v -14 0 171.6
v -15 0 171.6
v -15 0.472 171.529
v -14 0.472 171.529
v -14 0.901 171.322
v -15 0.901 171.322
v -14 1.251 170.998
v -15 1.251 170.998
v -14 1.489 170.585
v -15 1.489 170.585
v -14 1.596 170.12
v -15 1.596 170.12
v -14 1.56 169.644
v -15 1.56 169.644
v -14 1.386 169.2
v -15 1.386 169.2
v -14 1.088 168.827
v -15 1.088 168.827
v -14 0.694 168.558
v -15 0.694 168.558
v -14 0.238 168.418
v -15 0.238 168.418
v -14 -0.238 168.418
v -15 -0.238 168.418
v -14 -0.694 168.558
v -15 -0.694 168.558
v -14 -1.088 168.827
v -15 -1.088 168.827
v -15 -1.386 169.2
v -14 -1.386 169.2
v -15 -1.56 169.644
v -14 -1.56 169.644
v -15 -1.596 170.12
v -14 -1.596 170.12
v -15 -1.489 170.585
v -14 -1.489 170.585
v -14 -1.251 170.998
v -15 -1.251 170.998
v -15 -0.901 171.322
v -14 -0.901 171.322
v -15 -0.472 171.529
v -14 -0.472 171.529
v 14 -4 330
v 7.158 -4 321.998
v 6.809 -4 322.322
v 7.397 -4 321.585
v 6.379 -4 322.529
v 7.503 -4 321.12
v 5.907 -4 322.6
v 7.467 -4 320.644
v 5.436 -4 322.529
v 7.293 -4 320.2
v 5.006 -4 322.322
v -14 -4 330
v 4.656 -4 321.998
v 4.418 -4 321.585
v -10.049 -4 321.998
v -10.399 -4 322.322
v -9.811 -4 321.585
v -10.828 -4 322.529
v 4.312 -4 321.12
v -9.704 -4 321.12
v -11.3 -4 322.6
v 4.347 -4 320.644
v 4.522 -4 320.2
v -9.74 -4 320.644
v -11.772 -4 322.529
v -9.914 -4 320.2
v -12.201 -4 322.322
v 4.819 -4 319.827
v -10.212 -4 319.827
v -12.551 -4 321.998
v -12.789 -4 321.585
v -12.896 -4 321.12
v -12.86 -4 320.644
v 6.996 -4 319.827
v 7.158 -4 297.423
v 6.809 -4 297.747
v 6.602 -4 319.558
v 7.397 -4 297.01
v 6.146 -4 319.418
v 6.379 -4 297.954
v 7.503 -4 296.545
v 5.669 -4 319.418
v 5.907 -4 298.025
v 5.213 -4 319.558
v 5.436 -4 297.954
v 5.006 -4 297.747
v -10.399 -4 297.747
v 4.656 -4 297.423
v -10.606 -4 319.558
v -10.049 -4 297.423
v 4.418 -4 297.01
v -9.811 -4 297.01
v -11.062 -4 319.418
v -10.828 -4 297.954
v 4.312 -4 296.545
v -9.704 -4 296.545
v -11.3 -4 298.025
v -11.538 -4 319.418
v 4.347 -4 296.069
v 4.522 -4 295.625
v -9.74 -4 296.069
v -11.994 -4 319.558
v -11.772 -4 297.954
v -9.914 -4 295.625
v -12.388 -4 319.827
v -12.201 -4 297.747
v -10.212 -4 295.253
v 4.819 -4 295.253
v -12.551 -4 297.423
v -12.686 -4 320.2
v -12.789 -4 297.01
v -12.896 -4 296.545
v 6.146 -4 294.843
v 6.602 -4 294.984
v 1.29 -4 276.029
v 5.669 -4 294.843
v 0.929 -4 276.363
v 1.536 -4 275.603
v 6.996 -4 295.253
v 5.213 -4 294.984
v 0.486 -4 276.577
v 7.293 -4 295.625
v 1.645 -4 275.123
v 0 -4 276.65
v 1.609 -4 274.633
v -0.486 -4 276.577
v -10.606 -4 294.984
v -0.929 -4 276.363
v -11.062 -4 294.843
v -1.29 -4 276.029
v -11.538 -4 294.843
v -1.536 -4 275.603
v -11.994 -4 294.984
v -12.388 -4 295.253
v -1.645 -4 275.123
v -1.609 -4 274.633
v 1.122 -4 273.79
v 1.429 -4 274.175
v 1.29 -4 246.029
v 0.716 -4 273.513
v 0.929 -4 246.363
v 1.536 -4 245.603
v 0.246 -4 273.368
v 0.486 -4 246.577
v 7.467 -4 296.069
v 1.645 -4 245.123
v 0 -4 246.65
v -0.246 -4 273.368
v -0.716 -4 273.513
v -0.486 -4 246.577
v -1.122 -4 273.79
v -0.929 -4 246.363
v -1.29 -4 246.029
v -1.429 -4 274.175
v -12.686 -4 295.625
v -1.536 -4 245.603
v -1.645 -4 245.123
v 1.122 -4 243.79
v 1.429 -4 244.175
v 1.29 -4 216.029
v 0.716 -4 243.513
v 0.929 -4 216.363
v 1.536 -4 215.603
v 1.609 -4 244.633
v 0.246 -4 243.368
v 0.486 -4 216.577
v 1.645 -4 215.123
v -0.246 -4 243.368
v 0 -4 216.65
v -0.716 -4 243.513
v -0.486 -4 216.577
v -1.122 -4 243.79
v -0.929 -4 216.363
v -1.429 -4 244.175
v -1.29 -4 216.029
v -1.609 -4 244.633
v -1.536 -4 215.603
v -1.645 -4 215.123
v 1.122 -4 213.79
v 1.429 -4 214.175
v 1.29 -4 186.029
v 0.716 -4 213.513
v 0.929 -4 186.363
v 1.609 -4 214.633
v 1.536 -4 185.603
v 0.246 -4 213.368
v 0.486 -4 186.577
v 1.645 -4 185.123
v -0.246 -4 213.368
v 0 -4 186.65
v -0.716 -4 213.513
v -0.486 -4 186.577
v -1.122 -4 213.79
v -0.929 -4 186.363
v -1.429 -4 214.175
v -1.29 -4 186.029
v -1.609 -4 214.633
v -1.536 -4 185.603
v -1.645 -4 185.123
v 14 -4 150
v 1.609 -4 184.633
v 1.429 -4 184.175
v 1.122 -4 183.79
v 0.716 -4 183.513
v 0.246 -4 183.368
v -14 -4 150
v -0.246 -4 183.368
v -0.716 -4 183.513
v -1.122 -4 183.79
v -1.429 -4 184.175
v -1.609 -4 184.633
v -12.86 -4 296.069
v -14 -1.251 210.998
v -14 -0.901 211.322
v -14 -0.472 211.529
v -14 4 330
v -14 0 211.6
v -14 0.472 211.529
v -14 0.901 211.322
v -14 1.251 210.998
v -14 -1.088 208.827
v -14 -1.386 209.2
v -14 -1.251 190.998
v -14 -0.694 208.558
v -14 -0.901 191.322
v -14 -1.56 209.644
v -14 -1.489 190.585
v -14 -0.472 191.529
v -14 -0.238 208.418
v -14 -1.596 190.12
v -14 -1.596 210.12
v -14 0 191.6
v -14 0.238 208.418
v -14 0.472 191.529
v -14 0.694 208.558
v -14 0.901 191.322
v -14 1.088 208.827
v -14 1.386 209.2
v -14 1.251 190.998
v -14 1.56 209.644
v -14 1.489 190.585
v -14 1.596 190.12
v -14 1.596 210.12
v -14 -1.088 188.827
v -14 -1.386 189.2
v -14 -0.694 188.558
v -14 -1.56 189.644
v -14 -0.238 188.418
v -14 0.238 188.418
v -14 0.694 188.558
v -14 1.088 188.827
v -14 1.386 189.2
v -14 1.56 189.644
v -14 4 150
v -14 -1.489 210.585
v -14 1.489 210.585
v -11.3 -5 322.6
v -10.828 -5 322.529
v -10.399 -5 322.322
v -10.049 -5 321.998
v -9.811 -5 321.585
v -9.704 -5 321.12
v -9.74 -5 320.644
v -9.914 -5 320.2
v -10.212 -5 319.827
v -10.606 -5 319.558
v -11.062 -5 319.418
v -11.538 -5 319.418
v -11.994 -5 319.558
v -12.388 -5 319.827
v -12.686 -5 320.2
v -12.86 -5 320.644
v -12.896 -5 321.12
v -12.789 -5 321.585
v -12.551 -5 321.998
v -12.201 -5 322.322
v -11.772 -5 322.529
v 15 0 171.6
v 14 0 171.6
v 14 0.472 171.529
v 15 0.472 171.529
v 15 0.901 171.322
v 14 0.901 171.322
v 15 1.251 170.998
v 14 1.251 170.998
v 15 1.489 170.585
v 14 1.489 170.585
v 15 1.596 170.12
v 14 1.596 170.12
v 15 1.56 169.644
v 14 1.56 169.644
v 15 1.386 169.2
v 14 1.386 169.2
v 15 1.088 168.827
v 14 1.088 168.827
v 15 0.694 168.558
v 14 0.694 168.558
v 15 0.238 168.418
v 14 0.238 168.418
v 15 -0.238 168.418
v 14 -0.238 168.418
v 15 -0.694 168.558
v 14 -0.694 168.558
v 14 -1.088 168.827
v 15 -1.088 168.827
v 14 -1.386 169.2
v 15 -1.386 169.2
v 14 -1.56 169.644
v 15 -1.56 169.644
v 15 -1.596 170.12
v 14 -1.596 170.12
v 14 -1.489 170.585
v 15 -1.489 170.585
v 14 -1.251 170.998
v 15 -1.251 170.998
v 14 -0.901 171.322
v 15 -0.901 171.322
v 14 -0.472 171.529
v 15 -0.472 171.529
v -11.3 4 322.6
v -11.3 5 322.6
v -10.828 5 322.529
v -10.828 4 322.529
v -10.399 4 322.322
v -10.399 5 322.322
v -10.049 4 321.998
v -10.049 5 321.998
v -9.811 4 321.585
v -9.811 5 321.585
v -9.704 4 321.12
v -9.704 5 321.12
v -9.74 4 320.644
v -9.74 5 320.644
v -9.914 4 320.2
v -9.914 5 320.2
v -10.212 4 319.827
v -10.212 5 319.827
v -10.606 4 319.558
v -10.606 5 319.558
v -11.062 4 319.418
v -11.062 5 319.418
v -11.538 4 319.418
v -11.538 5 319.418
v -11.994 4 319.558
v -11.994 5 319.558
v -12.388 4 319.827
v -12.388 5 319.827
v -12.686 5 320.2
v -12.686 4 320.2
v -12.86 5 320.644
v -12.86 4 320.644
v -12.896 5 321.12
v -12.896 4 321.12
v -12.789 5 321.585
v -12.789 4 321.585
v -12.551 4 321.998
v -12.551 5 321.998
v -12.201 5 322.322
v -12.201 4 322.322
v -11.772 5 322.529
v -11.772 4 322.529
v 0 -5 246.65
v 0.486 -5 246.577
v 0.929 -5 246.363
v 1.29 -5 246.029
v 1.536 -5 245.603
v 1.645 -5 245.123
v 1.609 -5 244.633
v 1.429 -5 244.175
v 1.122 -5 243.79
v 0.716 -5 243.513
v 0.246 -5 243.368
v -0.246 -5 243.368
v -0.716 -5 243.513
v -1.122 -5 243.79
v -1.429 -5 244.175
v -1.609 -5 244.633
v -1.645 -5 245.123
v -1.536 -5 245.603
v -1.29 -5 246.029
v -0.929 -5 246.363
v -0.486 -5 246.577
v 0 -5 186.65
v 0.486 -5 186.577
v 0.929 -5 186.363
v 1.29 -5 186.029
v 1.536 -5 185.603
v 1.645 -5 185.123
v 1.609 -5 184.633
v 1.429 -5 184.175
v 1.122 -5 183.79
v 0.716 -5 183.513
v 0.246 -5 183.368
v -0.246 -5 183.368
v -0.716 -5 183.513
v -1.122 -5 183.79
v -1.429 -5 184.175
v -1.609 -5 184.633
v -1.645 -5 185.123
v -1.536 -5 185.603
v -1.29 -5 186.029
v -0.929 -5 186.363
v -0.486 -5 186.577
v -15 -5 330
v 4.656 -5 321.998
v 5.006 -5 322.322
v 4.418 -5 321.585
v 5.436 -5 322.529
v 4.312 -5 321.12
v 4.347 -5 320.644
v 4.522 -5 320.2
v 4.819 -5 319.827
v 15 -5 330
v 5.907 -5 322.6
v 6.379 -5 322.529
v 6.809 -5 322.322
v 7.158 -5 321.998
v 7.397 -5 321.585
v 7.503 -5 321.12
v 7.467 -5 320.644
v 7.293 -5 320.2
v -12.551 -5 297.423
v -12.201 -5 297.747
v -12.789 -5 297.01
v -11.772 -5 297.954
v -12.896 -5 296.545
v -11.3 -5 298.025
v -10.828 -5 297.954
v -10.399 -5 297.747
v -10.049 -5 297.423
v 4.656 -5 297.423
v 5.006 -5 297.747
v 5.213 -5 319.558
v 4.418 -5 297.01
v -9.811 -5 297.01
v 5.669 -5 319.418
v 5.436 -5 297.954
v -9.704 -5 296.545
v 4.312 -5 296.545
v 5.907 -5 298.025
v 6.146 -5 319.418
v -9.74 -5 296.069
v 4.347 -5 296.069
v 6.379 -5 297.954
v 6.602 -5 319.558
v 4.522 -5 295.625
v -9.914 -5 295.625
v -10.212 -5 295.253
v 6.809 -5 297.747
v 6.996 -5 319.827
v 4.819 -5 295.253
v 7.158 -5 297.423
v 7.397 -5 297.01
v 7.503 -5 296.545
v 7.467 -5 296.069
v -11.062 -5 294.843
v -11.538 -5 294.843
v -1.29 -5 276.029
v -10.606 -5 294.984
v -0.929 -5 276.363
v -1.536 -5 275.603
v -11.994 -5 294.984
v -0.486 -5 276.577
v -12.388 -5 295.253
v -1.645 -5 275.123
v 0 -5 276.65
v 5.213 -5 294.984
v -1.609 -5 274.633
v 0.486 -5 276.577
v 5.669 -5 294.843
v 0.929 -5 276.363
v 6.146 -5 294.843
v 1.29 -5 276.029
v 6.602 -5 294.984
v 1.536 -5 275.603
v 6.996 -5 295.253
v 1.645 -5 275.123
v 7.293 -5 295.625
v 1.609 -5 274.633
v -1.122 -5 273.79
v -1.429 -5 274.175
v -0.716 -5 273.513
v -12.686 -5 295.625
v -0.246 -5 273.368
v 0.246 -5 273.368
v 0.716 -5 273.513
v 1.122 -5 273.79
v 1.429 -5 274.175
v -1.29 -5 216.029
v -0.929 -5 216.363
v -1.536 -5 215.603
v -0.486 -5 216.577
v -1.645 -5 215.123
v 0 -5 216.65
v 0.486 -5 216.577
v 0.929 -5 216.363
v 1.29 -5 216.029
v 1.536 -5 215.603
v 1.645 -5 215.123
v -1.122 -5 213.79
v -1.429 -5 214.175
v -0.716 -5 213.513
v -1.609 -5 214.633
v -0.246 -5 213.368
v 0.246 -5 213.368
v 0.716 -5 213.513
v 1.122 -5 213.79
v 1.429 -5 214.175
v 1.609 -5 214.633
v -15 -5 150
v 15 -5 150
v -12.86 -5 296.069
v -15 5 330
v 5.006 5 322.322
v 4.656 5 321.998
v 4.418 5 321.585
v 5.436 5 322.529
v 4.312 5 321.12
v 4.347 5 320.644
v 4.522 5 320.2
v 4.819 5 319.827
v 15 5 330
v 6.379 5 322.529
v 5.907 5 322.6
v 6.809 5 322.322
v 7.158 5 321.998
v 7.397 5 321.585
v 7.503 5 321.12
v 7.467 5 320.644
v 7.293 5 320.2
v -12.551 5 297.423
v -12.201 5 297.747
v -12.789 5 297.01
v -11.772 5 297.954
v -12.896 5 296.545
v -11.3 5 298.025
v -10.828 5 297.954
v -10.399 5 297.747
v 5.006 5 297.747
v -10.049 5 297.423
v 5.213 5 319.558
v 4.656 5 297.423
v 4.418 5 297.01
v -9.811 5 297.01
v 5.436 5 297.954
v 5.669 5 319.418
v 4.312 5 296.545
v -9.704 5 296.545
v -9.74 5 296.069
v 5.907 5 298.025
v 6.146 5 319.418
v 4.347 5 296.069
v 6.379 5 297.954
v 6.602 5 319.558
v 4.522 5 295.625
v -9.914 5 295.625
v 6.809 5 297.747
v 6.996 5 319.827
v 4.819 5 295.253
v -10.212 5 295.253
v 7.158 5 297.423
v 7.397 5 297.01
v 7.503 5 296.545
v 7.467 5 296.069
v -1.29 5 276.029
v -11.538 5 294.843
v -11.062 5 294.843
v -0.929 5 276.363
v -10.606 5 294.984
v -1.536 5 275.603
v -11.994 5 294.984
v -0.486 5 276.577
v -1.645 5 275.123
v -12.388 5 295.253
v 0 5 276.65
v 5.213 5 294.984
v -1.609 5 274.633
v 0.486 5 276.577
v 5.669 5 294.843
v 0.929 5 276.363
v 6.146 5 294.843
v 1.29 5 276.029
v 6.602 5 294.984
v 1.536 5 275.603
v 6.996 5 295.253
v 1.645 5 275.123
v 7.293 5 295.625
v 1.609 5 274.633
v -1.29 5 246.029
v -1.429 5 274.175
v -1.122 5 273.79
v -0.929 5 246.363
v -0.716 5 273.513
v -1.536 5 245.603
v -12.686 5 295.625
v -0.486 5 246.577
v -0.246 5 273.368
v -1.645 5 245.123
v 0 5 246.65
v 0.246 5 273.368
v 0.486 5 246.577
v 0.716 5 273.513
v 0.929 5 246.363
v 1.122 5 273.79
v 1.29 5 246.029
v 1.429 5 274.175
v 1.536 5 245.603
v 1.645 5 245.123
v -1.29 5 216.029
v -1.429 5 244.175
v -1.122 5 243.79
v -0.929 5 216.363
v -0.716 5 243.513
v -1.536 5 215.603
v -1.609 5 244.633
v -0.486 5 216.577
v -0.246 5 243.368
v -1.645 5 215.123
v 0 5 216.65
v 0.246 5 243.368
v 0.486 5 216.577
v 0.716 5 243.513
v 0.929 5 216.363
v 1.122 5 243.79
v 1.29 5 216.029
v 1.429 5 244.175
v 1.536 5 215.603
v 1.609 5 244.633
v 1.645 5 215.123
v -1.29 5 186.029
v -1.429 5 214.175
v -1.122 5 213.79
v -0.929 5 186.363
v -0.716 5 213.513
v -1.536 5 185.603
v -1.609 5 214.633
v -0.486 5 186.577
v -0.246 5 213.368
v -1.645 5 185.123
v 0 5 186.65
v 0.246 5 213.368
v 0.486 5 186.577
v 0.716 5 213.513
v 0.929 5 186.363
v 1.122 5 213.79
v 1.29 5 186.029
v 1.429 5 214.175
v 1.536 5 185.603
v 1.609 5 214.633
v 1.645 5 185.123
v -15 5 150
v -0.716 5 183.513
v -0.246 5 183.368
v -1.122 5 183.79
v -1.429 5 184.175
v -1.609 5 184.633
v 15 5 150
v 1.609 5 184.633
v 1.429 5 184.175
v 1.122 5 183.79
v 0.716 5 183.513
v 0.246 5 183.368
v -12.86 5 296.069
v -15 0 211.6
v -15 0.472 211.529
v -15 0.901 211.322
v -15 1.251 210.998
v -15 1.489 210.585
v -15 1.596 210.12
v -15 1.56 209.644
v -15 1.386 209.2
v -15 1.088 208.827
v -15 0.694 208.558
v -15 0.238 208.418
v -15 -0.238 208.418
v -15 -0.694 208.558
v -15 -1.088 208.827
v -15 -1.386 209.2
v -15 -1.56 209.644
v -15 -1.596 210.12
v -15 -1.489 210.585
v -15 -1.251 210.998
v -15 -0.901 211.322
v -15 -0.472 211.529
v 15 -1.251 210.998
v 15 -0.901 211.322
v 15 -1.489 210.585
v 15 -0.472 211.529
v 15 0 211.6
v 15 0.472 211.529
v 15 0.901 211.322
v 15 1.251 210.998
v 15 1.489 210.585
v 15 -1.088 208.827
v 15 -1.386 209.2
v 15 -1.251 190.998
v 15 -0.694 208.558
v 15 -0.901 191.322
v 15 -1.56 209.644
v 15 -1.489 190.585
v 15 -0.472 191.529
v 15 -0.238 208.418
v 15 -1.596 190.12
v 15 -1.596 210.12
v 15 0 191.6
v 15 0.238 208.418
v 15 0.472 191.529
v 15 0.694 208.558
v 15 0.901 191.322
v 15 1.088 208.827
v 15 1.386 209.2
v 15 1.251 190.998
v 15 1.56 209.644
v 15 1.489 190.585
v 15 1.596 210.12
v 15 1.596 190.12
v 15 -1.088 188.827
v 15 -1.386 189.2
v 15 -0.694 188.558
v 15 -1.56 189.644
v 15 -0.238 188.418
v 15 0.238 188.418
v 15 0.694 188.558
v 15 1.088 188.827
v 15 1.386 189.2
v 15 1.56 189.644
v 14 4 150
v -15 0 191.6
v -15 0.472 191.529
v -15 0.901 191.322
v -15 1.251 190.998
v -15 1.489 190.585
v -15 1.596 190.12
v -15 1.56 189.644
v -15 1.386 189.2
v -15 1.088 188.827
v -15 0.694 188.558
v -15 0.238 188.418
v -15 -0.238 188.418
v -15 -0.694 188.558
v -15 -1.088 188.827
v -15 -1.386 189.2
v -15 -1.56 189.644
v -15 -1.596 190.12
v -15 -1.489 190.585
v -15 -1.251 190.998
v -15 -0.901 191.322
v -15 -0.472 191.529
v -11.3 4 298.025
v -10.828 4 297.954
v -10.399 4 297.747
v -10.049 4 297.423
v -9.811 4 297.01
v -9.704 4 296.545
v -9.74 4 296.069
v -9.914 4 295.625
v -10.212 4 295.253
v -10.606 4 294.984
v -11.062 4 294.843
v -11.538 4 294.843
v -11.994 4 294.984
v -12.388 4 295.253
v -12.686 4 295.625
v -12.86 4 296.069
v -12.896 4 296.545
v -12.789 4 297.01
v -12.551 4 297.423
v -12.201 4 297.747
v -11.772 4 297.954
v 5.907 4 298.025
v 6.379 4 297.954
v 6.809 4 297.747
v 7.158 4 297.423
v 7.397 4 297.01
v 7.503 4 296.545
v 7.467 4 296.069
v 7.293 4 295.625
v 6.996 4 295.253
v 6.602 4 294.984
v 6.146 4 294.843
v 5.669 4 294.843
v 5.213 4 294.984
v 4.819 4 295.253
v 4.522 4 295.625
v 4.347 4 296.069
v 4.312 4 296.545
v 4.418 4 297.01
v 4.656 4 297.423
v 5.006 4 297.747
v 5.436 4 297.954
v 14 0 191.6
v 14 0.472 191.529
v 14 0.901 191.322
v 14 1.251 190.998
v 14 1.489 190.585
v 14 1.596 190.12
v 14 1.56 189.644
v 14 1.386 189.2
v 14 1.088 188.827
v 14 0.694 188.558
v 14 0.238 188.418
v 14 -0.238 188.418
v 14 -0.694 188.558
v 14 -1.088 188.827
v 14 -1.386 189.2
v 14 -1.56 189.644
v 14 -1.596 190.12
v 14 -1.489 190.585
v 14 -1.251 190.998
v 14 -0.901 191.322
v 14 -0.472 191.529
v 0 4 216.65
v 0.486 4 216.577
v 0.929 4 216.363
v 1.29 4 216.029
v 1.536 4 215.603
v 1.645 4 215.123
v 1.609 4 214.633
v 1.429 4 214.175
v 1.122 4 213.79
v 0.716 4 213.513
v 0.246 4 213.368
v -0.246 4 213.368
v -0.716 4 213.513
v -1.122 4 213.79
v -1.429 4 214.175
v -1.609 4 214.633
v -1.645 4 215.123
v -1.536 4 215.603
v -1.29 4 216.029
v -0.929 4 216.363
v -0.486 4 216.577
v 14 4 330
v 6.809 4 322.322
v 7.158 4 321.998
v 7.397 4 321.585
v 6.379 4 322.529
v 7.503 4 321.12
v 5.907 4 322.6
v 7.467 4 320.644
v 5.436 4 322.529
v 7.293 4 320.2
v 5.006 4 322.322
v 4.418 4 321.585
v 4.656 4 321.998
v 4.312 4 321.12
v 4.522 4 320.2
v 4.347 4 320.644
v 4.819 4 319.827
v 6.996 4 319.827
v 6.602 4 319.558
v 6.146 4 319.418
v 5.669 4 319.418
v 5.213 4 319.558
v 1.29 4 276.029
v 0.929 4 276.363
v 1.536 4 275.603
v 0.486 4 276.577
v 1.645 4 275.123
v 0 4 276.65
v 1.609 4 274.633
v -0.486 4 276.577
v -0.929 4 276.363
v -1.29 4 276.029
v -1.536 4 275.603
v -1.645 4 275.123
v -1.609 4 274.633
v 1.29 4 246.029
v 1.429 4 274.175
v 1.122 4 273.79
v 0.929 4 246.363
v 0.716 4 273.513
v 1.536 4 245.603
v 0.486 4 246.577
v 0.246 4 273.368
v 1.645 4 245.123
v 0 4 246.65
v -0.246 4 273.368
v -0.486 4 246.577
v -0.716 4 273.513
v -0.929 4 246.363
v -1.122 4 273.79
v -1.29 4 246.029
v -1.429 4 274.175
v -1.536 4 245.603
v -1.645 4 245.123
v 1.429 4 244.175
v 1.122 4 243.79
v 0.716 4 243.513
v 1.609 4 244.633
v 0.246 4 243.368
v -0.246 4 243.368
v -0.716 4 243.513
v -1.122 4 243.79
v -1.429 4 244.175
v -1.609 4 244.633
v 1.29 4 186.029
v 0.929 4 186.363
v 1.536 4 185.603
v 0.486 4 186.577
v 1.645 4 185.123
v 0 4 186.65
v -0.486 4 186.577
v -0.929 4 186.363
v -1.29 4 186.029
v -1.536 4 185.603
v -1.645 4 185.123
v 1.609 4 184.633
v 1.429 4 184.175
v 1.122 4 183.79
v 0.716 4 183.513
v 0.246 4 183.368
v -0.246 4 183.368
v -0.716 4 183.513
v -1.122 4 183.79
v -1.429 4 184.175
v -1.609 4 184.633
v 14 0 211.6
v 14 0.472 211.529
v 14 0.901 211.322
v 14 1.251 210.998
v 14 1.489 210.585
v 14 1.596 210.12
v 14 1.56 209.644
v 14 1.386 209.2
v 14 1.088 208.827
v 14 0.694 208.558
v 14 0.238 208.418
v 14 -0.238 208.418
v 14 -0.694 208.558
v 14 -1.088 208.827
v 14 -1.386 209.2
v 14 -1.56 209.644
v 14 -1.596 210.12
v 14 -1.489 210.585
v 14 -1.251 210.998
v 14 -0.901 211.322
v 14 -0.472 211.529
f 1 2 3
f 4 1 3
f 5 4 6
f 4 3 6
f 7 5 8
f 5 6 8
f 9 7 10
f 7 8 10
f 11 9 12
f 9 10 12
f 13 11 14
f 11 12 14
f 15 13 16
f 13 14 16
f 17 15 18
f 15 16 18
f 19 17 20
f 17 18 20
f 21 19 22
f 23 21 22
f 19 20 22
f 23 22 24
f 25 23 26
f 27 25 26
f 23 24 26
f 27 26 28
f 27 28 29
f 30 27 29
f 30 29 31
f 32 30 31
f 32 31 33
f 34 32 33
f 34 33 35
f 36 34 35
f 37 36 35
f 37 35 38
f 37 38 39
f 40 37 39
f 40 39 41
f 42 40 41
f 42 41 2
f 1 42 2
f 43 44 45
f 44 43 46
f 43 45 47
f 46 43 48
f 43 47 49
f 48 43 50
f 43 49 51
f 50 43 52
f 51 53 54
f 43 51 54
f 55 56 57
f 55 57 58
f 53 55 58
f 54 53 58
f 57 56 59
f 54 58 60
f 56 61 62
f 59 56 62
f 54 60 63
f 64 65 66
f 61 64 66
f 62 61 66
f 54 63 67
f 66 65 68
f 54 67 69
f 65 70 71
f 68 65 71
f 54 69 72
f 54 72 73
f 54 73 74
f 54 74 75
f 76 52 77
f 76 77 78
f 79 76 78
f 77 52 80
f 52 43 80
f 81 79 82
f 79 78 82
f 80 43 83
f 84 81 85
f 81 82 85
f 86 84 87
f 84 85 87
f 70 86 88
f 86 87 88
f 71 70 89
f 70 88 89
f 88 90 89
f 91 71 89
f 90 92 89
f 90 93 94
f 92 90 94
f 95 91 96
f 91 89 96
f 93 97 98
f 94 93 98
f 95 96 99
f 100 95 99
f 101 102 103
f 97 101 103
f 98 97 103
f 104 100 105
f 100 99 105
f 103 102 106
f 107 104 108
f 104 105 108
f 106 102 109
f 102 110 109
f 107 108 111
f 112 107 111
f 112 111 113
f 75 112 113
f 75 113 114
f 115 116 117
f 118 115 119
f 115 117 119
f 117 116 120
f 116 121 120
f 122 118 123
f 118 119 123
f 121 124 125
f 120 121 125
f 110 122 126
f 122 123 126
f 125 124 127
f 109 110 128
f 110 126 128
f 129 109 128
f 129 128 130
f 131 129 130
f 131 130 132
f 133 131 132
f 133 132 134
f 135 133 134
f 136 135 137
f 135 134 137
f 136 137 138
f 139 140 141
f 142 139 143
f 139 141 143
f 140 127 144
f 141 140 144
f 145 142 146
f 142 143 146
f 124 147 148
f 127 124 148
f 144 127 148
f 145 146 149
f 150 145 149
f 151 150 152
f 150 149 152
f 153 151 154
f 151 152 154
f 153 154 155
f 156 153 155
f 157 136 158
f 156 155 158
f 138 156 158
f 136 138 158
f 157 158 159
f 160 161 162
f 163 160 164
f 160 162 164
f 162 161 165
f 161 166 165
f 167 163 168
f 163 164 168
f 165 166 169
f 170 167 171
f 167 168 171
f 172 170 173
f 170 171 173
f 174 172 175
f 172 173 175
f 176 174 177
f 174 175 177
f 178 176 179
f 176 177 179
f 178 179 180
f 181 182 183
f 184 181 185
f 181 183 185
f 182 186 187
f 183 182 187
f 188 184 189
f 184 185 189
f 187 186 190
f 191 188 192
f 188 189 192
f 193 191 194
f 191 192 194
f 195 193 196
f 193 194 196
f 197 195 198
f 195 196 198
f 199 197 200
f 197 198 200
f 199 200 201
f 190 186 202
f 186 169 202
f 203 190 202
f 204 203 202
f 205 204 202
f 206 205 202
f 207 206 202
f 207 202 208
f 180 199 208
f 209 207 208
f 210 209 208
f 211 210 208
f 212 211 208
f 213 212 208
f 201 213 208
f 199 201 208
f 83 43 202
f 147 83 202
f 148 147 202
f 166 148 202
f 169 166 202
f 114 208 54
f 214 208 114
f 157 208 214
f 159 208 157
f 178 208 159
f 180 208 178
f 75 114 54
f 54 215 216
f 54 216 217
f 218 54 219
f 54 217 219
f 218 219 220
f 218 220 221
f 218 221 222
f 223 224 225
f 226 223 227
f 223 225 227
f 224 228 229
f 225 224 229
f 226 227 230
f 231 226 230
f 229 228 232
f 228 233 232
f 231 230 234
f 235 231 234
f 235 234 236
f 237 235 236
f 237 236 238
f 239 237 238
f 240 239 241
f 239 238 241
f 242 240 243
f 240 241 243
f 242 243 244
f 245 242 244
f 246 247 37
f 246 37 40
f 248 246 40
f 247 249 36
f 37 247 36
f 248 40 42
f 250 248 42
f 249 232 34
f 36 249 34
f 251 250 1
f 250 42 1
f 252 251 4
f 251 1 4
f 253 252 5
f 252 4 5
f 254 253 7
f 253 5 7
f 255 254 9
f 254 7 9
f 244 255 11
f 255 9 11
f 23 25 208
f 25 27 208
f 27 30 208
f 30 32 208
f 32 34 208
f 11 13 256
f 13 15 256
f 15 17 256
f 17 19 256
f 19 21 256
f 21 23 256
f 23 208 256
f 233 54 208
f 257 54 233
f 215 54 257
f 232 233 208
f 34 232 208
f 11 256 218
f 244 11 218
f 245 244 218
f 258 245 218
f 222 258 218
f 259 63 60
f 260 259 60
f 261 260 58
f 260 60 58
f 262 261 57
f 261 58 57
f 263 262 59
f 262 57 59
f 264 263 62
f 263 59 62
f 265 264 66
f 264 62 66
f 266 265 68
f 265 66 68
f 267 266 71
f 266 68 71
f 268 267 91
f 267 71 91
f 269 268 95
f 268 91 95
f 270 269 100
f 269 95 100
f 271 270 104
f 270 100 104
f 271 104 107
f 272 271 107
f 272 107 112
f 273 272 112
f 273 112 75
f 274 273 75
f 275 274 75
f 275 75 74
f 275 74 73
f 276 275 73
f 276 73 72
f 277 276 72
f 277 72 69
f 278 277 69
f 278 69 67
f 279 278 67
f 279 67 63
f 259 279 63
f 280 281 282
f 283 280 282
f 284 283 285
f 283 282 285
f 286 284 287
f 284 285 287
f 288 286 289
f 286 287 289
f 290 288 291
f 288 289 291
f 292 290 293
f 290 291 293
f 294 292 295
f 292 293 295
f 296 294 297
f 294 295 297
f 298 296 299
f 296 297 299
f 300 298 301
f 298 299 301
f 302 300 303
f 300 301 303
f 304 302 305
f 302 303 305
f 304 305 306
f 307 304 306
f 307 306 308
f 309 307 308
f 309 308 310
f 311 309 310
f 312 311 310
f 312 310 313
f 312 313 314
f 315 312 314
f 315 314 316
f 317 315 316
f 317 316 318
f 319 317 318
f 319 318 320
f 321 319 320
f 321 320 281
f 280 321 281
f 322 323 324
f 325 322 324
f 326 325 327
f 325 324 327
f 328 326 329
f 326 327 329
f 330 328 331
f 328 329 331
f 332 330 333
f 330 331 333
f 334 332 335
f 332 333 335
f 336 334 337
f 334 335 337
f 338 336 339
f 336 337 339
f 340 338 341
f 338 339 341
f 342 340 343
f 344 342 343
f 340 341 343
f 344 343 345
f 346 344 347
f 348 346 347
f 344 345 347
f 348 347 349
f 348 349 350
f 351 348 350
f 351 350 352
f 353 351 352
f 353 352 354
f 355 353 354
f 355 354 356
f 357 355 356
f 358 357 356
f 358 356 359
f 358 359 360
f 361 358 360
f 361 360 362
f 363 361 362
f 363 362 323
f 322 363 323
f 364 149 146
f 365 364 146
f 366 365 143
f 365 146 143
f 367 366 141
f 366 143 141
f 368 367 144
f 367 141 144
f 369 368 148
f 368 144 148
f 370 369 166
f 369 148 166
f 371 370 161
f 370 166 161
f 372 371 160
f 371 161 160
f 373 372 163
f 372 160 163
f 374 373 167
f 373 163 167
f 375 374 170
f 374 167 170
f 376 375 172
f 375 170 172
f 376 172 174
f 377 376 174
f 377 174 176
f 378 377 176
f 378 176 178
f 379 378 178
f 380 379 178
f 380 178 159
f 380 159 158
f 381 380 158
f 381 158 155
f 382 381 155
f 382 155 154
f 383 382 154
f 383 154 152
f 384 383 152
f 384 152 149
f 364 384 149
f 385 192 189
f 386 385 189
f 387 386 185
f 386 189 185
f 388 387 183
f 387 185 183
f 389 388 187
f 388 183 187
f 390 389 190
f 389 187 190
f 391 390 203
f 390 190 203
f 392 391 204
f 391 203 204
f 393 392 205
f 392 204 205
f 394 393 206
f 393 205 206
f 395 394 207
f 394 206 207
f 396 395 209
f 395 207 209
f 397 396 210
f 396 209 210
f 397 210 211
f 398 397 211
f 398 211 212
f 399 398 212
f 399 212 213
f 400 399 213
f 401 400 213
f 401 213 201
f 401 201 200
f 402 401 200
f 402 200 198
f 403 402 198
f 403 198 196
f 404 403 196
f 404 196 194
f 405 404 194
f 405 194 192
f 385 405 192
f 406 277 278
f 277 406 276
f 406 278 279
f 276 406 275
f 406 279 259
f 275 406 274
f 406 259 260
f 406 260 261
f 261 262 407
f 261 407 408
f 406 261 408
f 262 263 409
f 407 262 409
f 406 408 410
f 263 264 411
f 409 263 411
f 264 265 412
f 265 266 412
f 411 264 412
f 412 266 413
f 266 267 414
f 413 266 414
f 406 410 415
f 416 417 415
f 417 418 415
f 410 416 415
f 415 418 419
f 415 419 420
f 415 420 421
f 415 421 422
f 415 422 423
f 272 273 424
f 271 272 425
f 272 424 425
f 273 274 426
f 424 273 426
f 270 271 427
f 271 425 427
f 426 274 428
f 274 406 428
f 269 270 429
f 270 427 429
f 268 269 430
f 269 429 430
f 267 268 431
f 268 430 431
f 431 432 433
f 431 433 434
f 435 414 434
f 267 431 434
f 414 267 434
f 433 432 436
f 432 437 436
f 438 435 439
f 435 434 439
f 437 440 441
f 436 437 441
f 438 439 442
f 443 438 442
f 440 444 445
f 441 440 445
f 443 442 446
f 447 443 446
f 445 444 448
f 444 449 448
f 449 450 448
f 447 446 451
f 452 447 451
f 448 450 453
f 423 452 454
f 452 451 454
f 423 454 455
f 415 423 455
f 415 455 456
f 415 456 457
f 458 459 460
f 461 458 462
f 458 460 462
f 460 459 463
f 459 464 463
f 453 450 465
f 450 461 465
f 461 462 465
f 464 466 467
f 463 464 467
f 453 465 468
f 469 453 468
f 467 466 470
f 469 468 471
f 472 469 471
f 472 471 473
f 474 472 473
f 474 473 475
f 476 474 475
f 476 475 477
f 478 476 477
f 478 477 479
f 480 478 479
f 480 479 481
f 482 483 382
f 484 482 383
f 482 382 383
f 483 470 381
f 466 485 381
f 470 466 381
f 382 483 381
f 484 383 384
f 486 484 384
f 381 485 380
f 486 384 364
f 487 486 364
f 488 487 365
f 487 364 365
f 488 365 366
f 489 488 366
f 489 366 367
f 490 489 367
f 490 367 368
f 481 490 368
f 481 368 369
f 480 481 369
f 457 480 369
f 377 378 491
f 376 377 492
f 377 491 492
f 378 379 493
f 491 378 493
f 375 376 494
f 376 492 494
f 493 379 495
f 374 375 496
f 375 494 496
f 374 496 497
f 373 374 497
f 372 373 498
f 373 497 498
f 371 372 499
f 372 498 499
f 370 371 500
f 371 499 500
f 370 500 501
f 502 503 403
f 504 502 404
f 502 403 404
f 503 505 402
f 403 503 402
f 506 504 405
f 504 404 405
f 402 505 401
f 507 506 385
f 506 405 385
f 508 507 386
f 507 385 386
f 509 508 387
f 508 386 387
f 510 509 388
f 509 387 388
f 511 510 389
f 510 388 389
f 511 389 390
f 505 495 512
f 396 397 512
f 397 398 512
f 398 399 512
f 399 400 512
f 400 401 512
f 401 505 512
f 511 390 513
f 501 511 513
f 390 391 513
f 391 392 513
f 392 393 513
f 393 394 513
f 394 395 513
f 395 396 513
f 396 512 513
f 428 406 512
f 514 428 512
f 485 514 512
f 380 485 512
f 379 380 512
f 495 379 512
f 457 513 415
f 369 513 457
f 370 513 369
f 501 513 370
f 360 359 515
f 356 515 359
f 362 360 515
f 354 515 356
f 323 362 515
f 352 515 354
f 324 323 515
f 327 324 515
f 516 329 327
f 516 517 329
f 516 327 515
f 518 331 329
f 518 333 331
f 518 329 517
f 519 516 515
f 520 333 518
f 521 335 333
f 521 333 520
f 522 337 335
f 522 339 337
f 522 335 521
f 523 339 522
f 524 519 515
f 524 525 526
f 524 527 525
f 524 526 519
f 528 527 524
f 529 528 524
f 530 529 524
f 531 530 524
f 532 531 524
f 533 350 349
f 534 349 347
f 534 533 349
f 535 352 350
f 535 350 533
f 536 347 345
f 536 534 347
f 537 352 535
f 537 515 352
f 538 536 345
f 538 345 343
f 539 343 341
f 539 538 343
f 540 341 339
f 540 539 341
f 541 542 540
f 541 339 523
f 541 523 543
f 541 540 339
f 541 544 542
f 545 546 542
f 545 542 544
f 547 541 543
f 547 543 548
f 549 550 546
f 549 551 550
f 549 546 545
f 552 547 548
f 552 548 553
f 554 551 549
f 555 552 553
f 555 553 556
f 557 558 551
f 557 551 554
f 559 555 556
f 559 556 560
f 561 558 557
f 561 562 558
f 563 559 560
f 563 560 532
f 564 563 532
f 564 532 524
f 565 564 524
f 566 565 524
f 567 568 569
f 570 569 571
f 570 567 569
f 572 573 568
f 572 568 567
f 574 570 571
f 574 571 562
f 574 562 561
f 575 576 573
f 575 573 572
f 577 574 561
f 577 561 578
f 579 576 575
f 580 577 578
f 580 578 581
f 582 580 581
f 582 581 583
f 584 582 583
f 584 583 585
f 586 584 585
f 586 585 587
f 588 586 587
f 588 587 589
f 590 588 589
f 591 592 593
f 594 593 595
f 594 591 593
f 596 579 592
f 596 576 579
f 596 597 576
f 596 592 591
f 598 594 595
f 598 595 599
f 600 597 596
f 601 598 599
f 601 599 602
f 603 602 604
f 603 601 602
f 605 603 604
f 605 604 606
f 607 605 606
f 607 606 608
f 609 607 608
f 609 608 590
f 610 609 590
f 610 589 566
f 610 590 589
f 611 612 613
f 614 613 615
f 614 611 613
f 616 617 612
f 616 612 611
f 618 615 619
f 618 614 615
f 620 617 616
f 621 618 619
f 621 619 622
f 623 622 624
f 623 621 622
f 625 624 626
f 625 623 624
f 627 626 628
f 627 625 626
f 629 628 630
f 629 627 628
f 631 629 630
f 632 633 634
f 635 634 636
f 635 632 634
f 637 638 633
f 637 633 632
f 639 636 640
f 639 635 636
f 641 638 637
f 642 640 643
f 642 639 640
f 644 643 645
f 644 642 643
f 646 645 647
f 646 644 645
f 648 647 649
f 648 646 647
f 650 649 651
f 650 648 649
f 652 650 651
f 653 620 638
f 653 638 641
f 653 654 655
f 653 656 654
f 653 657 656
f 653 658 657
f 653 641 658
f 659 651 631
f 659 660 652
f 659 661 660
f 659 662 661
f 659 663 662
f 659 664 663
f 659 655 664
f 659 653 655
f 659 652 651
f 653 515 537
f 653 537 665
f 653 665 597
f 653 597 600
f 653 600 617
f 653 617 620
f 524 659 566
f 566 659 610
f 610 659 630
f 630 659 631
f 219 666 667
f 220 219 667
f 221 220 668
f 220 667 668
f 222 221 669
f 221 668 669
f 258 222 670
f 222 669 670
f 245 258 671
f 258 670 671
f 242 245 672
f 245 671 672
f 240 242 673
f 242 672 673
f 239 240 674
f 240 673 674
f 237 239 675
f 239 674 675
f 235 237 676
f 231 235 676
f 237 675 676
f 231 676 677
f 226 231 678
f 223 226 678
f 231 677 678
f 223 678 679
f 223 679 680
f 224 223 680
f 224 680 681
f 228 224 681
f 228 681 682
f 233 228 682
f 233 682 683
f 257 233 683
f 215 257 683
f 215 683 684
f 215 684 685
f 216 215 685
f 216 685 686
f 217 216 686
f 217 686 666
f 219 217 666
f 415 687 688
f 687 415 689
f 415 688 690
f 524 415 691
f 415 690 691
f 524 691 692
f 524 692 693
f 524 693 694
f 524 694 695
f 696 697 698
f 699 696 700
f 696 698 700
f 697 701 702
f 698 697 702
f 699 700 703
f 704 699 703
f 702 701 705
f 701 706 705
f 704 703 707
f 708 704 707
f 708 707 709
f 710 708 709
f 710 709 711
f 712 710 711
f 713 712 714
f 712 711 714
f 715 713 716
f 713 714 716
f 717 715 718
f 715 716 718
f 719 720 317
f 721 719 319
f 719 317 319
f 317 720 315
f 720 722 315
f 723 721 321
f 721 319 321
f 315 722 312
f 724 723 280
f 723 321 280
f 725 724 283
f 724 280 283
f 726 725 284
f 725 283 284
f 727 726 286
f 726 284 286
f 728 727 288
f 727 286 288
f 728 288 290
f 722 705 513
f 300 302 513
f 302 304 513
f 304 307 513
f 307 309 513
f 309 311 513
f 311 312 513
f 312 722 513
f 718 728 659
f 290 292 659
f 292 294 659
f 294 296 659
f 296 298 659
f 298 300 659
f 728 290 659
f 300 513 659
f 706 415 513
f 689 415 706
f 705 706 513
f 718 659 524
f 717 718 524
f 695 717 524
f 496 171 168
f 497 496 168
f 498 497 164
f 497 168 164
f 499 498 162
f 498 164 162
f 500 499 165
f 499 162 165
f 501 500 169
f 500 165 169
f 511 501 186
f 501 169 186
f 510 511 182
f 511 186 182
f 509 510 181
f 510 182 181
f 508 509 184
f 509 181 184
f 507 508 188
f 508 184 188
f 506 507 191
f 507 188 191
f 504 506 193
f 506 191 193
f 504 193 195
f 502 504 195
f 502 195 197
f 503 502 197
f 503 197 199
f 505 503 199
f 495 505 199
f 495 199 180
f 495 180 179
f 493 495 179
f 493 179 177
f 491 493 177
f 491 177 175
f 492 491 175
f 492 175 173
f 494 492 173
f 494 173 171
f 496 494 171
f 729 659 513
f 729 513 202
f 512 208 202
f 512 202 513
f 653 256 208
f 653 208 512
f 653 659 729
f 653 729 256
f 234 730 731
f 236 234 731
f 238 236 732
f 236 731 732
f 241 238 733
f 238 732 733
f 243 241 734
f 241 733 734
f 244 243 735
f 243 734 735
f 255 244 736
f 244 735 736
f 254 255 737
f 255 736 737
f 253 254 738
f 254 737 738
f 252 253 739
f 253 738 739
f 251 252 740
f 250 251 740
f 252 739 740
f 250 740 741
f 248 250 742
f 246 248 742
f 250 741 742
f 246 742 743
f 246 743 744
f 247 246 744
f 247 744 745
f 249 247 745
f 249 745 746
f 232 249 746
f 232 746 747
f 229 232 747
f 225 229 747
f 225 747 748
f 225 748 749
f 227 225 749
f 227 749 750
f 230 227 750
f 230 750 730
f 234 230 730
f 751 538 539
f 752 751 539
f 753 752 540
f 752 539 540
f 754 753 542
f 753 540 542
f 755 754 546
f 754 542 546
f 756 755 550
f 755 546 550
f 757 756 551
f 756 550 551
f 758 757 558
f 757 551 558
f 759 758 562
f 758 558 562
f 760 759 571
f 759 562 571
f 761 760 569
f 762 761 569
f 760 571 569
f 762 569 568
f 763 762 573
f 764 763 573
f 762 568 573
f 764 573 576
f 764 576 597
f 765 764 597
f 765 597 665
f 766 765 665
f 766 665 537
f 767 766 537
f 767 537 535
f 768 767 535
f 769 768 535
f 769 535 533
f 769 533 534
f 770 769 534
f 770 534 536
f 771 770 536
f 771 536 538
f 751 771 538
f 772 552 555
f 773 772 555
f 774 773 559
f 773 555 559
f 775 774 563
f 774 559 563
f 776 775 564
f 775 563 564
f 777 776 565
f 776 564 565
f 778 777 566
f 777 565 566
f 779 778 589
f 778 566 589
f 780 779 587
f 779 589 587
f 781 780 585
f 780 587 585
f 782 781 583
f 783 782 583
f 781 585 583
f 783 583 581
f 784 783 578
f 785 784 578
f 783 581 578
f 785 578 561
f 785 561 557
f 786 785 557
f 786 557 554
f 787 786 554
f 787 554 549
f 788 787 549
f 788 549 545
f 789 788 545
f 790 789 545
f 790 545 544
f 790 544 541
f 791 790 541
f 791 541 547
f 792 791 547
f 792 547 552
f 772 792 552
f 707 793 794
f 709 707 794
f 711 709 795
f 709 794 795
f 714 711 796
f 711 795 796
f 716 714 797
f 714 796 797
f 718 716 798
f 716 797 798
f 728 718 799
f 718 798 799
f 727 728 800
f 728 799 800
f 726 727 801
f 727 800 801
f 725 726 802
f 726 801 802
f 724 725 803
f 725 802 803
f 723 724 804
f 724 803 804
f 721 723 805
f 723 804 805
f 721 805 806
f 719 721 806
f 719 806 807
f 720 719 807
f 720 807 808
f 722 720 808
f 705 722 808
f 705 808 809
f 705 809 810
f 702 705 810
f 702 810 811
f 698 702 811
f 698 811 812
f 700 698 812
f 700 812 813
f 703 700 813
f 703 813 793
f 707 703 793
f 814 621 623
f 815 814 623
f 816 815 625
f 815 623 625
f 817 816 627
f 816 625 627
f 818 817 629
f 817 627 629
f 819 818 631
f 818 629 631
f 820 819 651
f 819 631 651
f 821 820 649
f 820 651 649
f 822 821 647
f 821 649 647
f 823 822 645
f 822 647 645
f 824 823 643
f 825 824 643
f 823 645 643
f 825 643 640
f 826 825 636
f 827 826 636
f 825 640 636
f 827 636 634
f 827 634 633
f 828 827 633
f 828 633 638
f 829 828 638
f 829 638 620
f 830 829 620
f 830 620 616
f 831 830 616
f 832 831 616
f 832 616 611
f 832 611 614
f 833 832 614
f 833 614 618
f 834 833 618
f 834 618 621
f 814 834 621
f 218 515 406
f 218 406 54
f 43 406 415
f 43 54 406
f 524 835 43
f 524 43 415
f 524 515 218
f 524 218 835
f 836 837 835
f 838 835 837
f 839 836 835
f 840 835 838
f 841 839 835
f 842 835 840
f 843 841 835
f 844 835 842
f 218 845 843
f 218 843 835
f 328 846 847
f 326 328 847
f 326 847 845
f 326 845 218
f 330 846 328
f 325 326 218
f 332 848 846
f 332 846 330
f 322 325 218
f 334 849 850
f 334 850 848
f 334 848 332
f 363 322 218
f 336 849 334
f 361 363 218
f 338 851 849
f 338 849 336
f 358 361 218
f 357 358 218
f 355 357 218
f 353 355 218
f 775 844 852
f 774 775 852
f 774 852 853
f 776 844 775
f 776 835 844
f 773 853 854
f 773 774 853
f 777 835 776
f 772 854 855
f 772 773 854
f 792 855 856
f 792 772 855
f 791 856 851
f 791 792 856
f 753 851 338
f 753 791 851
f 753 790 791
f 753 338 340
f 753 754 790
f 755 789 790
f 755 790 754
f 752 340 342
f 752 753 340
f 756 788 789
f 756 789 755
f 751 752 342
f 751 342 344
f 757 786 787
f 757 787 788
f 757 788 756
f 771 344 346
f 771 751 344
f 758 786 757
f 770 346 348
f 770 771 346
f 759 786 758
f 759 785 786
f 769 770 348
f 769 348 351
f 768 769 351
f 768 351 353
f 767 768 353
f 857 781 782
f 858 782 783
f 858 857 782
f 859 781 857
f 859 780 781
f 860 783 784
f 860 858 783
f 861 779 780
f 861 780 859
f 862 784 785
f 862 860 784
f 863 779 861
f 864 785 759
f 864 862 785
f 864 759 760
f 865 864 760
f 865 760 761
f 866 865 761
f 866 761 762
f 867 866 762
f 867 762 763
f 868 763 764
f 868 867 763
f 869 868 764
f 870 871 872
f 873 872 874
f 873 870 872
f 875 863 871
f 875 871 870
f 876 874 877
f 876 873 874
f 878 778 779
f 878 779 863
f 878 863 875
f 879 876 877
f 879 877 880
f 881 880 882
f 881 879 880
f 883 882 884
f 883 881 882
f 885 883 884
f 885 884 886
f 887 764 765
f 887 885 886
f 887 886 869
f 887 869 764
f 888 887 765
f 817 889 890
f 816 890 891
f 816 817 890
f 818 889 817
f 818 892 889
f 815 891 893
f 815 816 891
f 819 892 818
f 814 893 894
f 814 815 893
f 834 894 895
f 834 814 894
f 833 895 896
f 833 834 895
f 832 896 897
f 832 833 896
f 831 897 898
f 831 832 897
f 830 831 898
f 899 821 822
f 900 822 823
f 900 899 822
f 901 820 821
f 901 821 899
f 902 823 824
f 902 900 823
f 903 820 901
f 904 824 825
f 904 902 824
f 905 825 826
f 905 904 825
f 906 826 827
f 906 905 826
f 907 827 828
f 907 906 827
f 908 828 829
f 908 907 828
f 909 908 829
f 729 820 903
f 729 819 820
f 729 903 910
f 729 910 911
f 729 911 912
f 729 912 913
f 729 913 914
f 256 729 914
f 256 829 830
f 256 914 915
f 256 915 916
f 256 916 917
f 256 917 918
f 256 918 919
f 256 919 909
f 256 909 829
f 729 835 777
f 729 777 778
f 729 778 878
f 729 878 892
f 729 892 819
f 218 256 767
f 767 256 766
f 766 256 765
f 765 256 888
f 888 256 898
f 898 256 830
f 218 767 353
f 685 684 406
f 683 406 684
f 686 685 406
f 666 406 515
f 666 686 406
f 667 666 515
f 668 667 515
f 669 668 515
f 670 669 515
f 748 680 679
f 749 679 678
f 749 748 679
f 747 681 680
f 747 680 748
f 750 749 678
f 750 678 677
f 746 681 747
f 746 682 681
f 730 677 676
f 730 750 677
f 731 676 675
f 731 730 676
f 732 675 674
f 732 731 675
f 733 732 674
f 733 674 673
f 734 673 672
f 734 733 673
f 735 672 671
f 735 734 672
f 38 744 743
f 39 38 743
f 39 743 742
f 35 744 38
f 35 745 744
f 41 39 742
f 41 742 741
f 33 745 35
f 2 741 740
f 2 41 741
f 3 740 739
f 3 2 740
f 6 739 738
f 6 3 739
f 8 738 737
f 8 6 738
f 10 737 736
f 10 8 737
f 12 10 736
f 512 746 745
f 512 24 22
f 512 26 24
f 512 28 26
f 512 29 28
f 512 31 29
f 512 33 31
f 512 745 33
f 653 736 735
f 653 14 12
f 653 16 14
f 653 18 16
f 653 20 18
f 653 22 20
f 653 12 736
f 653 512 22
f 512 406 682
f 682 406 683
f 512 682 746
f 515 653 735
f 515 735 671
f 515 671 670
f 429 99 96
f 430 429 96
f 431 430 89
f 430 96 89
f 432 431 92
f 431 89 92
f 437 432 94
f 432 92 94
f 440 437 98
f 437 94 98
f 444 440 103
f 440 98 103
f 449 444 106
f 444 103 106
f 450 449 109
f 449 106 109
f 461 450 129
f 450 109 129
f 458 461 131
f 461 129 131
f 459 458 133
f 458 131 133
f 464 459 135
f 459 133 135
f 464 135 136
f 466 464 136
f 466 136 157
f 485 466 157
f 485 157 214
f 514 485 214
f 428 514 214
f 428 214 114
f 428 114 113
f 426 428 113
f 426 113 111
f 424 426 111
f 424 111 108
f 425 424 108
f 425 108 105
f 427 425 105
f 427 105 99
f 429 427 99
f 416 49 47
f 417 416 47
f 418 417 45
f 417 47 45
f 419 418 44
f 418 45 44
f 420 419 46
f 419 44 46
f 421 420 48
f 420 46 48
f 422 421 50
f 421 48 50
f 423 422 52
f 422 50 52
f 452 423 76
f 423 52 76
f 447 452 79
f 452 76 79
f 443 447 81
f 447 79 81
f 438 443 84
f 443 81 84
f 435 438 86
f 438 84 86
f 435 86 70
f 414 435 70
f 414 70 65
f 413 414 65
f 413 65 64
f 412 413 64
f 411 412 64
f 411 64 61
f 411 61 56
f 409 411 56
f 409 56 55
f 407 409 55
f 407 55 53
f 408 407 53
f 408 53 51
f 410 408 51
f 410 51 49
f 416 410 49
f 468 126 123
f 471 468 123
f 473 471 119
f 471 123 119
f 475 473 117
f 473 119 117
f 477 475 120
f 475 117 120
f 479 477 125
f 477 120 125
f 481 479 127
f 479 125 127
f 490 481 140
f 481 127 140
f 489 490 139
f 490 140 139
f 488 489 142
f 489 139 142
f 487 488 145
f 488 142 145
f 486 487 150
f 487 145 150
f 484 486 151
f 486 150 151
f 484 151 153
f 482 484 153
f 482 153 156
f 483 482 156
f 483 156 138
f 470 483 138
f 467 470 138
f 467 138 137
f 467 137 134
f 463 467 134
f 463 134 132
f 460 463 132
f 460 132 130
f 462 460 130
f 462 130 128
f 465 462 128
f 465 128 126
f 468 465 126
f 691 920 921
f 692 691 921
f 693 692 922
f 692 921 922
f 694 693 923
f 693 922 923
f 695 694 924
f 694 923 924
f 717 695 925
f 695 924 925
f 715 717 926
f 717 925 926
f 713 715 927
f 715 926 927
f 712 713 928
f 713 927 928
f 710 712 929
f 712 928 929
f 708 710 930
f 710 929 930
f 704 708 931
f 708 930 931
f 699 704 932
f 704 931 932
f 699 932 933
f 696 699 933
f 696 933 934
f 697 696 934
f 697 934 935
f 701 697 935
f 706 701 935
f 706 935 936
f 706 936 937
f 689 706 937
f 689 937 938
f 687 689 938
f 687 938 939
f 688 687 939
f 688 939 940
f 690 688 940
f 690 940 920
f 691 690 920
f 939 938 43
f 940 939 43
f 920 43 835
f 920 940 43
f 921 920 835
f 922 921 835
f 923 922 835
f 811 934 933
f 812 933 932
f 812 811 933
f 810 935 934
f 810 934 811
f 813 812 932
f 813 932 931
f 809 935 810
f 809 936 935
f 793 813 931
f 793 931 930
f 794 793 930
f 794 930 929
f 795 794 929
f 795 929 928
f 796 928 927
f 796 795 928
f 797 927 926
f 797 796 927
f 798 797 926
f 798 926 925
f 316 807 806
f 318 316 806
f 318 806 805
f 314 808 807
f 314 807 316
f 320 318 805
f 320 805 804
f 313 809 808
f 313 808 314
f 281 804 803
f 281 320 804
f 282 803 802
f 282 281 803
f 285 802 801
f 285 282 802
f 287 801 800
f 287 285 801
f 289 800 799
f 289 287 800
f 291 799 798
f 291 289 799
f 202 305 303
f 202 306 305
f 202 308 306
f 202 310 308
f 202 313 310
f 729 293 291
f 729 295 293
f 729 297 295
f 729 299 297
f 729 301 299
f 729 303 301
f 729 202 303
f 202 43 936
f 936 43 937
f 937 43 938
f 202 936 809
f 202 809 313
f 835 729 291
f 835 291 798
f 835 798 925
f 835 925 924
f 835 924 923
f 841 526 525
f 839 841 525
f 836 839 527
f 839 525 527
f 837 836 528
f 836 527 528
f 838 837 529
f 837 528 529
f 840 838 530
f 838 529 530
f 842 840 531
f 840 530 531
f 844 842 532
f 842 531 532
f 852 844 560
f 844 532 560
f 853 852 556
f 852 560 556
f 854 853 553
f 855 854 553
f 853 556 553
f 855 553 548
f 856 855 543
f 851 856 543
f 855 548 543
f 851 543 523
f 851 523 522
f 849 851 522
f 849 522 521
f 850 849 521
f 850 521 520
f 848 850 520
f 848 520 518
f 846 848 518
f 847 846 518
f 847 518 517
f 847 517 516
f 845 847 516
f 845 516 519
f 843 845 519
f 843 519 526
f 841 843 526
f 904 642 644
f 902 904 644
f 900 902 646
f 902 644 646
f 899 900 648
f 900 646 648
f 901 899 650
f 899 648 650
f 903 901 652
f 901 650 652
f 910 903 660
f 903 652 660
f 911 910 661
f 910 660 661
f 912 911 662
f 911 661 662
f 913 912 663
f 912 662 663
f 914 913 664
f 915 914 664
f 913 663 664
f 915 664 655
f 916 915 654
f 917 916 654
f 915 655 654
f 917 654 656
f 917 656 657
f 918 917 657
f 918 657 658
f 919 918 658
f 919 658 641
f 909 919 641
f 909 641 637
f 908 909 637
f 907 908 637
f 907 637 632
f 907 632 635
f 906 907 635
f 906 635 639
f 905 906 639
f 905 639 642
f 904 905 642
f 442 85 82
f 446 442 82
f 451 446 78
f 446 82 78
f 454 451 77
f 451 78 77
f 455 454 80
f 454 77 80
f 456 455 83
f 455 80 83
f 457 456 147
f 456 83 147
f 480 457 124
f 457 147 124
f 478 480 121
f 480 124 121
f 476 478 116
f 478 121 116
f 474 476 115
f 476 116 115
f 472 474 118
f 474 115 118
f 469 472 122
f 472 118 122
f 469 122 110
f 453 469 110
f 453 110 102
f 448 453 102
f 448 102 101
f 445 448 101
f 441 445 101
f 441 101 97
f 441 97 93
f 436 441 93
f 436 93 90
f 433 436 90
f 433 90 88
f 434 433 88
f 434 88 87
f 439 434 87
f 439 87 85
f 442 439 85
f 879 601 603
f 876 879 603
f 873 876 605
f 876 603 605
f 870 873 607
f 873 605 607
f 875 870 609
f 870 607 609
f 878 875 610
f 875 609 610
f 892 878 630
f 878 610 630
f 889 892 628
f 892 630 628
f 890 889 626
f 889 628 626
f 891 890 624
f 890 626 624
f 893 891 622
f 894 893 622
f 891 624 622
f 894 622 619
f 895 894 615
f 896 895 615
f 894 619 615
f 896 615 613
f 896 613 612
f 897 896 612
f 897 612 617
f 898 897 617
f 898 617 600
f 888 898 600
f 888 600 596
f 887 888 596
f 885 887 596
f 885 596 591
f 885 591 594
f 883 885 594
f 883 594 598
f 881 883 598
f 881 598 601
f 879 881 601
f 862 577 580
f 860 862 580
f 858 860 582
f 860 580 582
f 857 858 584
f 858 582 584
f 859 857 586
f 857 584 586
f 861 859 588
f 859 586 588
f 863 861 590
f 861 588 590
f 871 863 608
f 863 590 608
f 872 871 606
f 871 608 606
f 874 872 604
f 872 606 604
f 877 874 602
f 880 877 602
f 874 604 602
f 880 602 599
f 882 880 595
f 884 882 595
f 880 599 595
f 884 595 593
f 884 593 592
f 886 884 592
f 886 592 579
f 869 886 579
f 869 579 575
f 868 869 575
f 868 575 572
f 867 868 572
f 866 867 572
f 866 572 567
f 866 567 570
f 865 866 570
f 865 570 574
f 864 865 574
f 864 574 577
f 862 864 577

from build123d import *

# Parameters (mm, degrees)
SKETCH_1_W          = 30
SKETCH_1_H          = 10
SKETCH_1_W_2        = 26
SKETCH_1_H_2        = 6
EXTRUDE_1_DEPTH     = 330
SKETCH_2_R          = 1.6
CUT_EXTRUDE_1_DEPTH = 331.492057393
SKETCH_3_R          = 1.6
SKETCH_3_R_2        = 1.65
CUT_EXTRUDE_2_DEPTH = 331.492057393
SKETCH_4_R          = 1.6
CUT_EXTRUDE_3_DEPTH = 332.398551596
SKETCH_6_W          = 28
SKETCH_6_H          = 8
CUT_EXTRUDE_5_DEPTH = 355
SKETCH_7_R          = 1.6
CUT_EXTRUDE_6_DEPTH = 14
SKETCH_9_W          = 30
SKETCH_9_H          = 10
CUT_EXTRUDE_7_DEPTH = 150


with BuildPart() as part:
    # 草图1 → 凸台-拉伸1 (new body)
    with BuildSketch(Plane.XY):
        Rectangle(SKETCH_1_W, SKETCH_1_H)
        Rectangle(SKETCH_1_W_2, SKETCH_1_H_2, mode=Mode.SUBTRACT)
    extrude(amount=EXTRUDE_1_DEPTH)

    # 草图2 → 切除-拉伸1 (cut, through all)
    with BuildSketch(Plane(origin=(0, 5, 0), x_dir=(1, 0, 0), z_dir=(0, 1, 0))):
        with Locations(Location((-11.3, -321, 0), (0, 0, 270))):
            Circle(SKETCH_2_R)
    extrude(amount=-CUT_EXTRUDE_1_DEPTH, mode=Mode.SUBTRACT)

    # 草图3 → 切除-拉伸2 (cut, through all)
    with BuildSketch(Plane(origin=(0, 5, 0), x_dir=(1, 0, 0), z_dir=(0, 1, 0))):
        with Locations(Location((5.907293091, -296.425438671, 0), (0, 0, 270))):
            Circle(SKETCH_3_R)
        with Locations(Location((0, -215, 0), (0, 0, 270))):
            Circle(SKETCH_3_R_2)
        with Locations(Location((0, -185, 0), (0, 0, 270))):
            Circle(SKETCH_3_R_2)
        with Locations(Location((0, -275, 0), (0, 0, 270))):
            Circle(SKETCH_3_R_2)
        with Locations(Location((0, -245, 0), (0, 0, 270))):
            Circle(SKETCH_3_R_2)
    extrude(amount=-CUT_EXTRUDE_2_DEPTH, mode=Mode.SUBTRACT)

    # 草图4 → 切除-拉伸3 (cut, through all)
    with BuildSketch(Plane.ZY.offset(15)):
        with Locations((170, 0)):
            Circle(SKETCH_4_R)
        with Locations((190, 0)):
            Circle(SKETCH_4_R)
        with Locations((210, 0)):
            Circle(SKETCH_4_R)
    extrude(amount=-CUT_EXTRUDE_3_DEPTH, mode=Mode.SUBTRACT)

    # 草图6 → 切除-拉伸5 (cut)
    with BuildSketch(Plane(origin=(0, 0, 0), x_dir=(-1, 0, 0), z_dir=(0, 0, -1))):
        Rectangle(SKETCH_6_W, SKETCH_6_H)
    extrude(amount=-CUT_EXTRUDE_5_DEPTH, mode=Mode.SUBTRACT)

    # 草图7 → 切除-拉伸6 (cut)
    with BuildSketch(Plane(origin=(0, 5, 0), x_dir=(1, 0, 0), z_dir=(0, 1, 0))):
        with Locations(Location((5.907293091, -321, 0), (0, 0, 270))):
            Circle(SKETCH_7_R)
        with Locations(Location((-11.3, -296.425438671, 0), (0, 0, 270))):
            Circle(SKETCH_7_R)
    extrude(amount=-CUT_EXTRUDE_6_DEPTH, mode=Mode.SUBTRACT)

    # 草图9 → 切除-拉伸7 (cut)
    with BuildSketch(Plane(origin=(0, 0, 0), x_dir=(-1, 0, 0), z_dir=(0, 0, -1))):
        Rectangle(SKETCH_9_W, SKETCH_9_H)
    extrude(amount=-CUT_EXTRUDE_7_DEPTH, mode=Mode.SUBTRACT)


solid = part.part
